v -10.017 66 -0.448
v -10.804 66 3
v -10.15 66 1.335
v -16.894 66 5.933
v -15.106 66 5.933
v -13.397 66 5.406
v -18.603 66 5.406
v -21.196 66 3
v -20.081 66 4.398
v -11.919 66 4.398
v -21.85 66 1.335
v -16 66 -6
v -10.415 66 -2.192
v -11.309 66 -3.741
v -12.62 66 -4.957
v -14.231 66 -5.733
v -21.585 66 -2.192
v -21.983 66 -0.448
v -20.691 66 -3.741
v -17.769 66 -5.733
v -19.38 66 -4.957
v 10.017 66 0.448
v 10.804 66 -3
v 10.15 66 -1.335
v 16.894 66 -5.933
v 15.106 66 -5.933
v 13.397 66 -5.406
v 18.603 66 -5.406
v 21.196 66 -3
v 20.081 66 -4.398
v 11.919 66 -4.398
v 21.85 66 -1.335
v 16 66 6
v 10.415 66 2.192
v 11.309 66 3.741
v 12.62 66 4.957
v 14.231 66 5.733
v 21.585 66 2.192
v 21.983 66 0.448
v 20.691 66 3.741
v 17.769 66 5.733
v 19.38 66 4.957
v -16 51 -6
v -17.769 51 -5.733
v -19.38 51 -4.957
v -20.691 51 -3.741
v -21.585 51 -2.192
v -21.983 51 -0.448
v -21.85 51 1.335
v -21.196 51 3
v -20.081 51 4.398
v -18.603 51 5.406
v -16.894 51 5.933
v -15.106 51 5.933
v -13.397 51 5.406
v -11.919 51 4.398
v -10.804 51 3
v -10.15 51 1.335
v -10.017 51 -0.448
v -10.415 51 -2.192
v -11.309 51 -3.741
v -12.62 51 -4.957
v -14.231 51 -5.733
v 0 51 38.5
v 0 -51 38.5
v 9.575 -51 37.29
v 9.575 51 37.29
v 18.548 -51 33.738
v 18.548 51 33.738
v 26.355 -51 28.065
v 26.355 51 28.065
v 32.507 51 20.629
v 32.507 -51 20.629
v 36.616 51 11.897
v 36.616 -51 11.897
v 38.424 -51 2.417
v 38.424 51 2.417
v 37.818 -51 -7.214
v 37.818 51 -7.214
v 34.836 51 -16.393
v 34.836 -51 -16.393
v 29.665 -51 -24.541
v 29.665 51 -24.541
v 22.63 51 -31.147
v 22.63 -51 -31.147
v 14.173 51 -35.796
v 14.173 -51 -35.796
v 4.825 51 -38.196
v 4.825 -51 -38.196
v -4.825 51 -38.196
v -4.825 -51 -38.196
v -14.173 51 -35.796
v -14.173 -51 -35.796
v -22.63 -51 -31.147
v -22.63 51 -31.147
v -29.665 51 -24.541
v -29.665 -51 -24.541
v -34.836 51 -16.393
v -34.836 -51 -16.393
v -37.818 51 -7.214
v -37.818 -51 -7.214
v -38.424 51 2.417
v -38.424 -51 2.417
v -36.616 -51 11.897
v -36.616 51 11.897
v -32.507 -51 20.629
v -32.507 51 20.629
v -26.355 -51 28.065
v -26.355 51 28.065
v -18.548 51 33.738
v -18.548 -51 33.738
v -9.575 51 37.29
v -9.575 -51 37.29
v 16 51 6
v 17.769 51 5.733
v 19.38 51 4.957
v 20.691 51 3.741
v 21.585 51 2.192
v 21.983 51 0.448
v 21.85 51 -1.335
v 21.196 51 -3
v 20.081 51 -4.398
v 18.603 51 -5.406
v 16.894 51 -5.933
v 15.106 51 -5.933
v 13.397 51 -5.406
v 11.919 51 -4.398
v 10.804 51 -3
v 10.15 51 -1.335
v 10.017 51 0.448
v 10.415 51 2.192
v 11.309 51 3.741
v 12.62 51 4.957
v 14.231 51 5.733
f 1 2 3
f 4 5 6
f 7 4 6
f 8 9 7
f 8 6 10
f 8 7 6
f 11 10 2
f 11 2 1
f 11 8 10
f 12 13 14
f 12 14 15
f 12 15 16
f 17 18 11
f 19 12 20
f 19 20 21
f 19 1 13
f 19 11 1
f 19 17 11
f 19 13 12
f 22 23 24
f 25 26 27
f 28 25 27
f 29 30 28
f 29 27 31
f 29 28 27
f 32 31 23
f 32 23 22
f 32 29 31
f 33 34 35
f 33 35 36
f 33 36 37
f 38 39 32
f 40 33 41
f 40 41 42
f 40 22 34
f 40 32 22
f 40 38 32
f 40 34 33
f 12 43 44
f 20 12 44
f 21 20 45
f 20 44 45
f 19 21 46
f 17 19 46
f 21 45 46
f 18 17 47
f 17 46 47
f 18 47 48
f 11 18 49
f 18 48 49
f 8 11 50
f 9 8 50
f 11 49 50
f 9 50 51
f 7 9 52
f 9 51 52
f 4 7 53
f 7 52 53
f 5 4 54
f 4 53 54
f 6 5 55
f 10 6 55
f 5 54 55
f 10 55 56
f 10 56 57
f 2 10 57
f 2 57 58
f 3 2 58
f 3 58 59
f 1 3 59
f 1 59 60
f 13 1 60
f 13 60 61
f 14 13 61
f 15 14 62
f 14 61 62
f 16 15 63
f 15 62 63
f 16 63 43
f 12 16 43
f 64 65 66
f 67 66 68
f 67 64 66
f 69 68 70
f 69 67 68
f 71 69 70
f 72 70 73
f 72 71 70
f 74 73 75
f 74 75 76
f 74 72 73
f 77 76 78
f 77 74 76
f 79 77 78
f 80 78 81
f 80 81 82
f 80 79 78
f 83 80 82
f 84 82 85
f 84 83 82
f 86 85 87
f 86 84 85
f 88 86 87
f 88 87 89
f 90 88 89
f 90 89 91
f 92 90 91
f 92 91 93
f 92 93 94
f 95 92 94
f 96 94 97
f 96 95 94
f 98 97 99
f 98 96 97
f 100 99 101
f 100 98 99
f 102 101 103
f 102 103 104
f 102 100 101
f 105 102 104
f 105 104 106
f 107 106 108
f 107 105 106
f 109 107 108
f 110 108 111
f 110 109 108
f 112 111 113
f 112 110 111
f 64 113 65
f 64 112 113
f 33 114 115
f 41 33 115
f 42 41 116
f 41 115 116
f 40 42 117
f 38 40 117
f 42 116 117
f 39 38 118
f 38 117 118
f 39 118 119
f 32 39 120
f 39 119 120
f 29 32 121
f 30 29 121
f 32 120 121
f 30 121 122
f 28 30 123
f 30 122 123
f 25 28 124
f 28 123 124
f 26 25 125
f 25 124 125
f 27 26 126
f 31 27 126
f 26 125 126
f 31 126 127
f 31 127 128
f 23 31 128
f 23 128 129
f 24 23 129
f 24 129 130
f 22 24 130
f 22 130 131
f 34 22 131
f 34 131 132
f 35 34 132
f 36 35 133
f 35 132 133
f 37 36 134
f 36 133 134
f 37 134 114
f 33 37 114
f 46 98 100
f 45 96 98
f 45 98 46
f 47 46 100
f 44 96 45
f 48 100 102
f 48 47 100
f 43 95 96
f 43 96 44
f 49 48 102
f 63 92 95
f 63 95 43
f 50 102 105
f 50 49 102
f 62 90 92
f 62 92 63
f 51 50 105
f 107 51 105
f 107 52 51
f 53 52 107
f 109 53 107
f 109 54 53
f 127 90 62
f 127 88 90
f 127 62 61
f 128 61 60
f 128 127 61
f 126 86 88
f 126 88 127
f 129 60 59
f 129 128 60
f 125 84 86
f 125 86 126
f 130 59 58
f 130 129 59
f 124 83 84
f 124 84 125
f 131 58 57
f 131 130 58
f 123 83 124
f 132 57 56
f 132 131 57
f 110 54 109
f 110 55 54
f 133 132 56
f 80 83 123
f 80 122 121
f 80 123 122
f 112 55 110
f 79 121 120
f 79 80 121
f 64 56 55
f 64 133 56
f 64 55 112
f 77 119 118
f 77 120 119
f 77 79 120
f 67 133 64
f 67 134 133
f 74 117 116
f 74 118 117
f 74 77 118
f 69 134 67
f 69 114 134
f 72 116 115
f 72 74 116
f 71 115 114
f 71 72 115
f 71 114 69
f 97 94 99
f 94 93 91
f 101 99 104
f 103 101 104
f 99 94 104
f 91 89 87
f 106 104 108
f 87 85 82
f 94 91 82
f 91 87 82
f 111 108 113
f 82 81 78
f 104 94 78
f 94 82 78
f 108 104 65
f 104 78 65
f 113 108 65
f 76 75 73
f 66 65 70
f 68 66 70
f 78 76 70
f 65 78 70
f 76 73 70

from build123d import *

# Parameters (mm, degrees)
SKETCH_1_R      = 38.5
EXTRUDE_1_DEPTH = 51
SKETCH_2_R      = 6
EXTRUDE_2_DEPTH = 15


with BuildPart() as part:
    # 草图1 → 凸台-拉伸1 (new, symmetric)
    with BuildSketch(Plane(origin=(0, 0, 0), x_dir=(1, 0, 0), z_dir=(0, 1, 0))):
        with Locations(Location((0, 0, 0), (0, 0, 270))):
            Circle(SKETCH_1_R)
    extrude(amount=EXTRUDE_1_DEPTH, both=True)

    # 草图2 → 凸台-拉伸2 (add)
    with BuildSketch(Plane(origin=(0, 51, 0), x_dir=(1, 0, 0), z_dir=(0, 1, 0))):
        with Locations(Location((16, 0, 0), (0, 0, 270))):
            Circle(SKETCH_2_R)
        with Locations(Location((-16, 0, 0), (0, 0, 90))):
            Circle(SKETCH_2_R)
    extrude(amount=EXTRUDE_2_DEPTH)


solid = part.part
